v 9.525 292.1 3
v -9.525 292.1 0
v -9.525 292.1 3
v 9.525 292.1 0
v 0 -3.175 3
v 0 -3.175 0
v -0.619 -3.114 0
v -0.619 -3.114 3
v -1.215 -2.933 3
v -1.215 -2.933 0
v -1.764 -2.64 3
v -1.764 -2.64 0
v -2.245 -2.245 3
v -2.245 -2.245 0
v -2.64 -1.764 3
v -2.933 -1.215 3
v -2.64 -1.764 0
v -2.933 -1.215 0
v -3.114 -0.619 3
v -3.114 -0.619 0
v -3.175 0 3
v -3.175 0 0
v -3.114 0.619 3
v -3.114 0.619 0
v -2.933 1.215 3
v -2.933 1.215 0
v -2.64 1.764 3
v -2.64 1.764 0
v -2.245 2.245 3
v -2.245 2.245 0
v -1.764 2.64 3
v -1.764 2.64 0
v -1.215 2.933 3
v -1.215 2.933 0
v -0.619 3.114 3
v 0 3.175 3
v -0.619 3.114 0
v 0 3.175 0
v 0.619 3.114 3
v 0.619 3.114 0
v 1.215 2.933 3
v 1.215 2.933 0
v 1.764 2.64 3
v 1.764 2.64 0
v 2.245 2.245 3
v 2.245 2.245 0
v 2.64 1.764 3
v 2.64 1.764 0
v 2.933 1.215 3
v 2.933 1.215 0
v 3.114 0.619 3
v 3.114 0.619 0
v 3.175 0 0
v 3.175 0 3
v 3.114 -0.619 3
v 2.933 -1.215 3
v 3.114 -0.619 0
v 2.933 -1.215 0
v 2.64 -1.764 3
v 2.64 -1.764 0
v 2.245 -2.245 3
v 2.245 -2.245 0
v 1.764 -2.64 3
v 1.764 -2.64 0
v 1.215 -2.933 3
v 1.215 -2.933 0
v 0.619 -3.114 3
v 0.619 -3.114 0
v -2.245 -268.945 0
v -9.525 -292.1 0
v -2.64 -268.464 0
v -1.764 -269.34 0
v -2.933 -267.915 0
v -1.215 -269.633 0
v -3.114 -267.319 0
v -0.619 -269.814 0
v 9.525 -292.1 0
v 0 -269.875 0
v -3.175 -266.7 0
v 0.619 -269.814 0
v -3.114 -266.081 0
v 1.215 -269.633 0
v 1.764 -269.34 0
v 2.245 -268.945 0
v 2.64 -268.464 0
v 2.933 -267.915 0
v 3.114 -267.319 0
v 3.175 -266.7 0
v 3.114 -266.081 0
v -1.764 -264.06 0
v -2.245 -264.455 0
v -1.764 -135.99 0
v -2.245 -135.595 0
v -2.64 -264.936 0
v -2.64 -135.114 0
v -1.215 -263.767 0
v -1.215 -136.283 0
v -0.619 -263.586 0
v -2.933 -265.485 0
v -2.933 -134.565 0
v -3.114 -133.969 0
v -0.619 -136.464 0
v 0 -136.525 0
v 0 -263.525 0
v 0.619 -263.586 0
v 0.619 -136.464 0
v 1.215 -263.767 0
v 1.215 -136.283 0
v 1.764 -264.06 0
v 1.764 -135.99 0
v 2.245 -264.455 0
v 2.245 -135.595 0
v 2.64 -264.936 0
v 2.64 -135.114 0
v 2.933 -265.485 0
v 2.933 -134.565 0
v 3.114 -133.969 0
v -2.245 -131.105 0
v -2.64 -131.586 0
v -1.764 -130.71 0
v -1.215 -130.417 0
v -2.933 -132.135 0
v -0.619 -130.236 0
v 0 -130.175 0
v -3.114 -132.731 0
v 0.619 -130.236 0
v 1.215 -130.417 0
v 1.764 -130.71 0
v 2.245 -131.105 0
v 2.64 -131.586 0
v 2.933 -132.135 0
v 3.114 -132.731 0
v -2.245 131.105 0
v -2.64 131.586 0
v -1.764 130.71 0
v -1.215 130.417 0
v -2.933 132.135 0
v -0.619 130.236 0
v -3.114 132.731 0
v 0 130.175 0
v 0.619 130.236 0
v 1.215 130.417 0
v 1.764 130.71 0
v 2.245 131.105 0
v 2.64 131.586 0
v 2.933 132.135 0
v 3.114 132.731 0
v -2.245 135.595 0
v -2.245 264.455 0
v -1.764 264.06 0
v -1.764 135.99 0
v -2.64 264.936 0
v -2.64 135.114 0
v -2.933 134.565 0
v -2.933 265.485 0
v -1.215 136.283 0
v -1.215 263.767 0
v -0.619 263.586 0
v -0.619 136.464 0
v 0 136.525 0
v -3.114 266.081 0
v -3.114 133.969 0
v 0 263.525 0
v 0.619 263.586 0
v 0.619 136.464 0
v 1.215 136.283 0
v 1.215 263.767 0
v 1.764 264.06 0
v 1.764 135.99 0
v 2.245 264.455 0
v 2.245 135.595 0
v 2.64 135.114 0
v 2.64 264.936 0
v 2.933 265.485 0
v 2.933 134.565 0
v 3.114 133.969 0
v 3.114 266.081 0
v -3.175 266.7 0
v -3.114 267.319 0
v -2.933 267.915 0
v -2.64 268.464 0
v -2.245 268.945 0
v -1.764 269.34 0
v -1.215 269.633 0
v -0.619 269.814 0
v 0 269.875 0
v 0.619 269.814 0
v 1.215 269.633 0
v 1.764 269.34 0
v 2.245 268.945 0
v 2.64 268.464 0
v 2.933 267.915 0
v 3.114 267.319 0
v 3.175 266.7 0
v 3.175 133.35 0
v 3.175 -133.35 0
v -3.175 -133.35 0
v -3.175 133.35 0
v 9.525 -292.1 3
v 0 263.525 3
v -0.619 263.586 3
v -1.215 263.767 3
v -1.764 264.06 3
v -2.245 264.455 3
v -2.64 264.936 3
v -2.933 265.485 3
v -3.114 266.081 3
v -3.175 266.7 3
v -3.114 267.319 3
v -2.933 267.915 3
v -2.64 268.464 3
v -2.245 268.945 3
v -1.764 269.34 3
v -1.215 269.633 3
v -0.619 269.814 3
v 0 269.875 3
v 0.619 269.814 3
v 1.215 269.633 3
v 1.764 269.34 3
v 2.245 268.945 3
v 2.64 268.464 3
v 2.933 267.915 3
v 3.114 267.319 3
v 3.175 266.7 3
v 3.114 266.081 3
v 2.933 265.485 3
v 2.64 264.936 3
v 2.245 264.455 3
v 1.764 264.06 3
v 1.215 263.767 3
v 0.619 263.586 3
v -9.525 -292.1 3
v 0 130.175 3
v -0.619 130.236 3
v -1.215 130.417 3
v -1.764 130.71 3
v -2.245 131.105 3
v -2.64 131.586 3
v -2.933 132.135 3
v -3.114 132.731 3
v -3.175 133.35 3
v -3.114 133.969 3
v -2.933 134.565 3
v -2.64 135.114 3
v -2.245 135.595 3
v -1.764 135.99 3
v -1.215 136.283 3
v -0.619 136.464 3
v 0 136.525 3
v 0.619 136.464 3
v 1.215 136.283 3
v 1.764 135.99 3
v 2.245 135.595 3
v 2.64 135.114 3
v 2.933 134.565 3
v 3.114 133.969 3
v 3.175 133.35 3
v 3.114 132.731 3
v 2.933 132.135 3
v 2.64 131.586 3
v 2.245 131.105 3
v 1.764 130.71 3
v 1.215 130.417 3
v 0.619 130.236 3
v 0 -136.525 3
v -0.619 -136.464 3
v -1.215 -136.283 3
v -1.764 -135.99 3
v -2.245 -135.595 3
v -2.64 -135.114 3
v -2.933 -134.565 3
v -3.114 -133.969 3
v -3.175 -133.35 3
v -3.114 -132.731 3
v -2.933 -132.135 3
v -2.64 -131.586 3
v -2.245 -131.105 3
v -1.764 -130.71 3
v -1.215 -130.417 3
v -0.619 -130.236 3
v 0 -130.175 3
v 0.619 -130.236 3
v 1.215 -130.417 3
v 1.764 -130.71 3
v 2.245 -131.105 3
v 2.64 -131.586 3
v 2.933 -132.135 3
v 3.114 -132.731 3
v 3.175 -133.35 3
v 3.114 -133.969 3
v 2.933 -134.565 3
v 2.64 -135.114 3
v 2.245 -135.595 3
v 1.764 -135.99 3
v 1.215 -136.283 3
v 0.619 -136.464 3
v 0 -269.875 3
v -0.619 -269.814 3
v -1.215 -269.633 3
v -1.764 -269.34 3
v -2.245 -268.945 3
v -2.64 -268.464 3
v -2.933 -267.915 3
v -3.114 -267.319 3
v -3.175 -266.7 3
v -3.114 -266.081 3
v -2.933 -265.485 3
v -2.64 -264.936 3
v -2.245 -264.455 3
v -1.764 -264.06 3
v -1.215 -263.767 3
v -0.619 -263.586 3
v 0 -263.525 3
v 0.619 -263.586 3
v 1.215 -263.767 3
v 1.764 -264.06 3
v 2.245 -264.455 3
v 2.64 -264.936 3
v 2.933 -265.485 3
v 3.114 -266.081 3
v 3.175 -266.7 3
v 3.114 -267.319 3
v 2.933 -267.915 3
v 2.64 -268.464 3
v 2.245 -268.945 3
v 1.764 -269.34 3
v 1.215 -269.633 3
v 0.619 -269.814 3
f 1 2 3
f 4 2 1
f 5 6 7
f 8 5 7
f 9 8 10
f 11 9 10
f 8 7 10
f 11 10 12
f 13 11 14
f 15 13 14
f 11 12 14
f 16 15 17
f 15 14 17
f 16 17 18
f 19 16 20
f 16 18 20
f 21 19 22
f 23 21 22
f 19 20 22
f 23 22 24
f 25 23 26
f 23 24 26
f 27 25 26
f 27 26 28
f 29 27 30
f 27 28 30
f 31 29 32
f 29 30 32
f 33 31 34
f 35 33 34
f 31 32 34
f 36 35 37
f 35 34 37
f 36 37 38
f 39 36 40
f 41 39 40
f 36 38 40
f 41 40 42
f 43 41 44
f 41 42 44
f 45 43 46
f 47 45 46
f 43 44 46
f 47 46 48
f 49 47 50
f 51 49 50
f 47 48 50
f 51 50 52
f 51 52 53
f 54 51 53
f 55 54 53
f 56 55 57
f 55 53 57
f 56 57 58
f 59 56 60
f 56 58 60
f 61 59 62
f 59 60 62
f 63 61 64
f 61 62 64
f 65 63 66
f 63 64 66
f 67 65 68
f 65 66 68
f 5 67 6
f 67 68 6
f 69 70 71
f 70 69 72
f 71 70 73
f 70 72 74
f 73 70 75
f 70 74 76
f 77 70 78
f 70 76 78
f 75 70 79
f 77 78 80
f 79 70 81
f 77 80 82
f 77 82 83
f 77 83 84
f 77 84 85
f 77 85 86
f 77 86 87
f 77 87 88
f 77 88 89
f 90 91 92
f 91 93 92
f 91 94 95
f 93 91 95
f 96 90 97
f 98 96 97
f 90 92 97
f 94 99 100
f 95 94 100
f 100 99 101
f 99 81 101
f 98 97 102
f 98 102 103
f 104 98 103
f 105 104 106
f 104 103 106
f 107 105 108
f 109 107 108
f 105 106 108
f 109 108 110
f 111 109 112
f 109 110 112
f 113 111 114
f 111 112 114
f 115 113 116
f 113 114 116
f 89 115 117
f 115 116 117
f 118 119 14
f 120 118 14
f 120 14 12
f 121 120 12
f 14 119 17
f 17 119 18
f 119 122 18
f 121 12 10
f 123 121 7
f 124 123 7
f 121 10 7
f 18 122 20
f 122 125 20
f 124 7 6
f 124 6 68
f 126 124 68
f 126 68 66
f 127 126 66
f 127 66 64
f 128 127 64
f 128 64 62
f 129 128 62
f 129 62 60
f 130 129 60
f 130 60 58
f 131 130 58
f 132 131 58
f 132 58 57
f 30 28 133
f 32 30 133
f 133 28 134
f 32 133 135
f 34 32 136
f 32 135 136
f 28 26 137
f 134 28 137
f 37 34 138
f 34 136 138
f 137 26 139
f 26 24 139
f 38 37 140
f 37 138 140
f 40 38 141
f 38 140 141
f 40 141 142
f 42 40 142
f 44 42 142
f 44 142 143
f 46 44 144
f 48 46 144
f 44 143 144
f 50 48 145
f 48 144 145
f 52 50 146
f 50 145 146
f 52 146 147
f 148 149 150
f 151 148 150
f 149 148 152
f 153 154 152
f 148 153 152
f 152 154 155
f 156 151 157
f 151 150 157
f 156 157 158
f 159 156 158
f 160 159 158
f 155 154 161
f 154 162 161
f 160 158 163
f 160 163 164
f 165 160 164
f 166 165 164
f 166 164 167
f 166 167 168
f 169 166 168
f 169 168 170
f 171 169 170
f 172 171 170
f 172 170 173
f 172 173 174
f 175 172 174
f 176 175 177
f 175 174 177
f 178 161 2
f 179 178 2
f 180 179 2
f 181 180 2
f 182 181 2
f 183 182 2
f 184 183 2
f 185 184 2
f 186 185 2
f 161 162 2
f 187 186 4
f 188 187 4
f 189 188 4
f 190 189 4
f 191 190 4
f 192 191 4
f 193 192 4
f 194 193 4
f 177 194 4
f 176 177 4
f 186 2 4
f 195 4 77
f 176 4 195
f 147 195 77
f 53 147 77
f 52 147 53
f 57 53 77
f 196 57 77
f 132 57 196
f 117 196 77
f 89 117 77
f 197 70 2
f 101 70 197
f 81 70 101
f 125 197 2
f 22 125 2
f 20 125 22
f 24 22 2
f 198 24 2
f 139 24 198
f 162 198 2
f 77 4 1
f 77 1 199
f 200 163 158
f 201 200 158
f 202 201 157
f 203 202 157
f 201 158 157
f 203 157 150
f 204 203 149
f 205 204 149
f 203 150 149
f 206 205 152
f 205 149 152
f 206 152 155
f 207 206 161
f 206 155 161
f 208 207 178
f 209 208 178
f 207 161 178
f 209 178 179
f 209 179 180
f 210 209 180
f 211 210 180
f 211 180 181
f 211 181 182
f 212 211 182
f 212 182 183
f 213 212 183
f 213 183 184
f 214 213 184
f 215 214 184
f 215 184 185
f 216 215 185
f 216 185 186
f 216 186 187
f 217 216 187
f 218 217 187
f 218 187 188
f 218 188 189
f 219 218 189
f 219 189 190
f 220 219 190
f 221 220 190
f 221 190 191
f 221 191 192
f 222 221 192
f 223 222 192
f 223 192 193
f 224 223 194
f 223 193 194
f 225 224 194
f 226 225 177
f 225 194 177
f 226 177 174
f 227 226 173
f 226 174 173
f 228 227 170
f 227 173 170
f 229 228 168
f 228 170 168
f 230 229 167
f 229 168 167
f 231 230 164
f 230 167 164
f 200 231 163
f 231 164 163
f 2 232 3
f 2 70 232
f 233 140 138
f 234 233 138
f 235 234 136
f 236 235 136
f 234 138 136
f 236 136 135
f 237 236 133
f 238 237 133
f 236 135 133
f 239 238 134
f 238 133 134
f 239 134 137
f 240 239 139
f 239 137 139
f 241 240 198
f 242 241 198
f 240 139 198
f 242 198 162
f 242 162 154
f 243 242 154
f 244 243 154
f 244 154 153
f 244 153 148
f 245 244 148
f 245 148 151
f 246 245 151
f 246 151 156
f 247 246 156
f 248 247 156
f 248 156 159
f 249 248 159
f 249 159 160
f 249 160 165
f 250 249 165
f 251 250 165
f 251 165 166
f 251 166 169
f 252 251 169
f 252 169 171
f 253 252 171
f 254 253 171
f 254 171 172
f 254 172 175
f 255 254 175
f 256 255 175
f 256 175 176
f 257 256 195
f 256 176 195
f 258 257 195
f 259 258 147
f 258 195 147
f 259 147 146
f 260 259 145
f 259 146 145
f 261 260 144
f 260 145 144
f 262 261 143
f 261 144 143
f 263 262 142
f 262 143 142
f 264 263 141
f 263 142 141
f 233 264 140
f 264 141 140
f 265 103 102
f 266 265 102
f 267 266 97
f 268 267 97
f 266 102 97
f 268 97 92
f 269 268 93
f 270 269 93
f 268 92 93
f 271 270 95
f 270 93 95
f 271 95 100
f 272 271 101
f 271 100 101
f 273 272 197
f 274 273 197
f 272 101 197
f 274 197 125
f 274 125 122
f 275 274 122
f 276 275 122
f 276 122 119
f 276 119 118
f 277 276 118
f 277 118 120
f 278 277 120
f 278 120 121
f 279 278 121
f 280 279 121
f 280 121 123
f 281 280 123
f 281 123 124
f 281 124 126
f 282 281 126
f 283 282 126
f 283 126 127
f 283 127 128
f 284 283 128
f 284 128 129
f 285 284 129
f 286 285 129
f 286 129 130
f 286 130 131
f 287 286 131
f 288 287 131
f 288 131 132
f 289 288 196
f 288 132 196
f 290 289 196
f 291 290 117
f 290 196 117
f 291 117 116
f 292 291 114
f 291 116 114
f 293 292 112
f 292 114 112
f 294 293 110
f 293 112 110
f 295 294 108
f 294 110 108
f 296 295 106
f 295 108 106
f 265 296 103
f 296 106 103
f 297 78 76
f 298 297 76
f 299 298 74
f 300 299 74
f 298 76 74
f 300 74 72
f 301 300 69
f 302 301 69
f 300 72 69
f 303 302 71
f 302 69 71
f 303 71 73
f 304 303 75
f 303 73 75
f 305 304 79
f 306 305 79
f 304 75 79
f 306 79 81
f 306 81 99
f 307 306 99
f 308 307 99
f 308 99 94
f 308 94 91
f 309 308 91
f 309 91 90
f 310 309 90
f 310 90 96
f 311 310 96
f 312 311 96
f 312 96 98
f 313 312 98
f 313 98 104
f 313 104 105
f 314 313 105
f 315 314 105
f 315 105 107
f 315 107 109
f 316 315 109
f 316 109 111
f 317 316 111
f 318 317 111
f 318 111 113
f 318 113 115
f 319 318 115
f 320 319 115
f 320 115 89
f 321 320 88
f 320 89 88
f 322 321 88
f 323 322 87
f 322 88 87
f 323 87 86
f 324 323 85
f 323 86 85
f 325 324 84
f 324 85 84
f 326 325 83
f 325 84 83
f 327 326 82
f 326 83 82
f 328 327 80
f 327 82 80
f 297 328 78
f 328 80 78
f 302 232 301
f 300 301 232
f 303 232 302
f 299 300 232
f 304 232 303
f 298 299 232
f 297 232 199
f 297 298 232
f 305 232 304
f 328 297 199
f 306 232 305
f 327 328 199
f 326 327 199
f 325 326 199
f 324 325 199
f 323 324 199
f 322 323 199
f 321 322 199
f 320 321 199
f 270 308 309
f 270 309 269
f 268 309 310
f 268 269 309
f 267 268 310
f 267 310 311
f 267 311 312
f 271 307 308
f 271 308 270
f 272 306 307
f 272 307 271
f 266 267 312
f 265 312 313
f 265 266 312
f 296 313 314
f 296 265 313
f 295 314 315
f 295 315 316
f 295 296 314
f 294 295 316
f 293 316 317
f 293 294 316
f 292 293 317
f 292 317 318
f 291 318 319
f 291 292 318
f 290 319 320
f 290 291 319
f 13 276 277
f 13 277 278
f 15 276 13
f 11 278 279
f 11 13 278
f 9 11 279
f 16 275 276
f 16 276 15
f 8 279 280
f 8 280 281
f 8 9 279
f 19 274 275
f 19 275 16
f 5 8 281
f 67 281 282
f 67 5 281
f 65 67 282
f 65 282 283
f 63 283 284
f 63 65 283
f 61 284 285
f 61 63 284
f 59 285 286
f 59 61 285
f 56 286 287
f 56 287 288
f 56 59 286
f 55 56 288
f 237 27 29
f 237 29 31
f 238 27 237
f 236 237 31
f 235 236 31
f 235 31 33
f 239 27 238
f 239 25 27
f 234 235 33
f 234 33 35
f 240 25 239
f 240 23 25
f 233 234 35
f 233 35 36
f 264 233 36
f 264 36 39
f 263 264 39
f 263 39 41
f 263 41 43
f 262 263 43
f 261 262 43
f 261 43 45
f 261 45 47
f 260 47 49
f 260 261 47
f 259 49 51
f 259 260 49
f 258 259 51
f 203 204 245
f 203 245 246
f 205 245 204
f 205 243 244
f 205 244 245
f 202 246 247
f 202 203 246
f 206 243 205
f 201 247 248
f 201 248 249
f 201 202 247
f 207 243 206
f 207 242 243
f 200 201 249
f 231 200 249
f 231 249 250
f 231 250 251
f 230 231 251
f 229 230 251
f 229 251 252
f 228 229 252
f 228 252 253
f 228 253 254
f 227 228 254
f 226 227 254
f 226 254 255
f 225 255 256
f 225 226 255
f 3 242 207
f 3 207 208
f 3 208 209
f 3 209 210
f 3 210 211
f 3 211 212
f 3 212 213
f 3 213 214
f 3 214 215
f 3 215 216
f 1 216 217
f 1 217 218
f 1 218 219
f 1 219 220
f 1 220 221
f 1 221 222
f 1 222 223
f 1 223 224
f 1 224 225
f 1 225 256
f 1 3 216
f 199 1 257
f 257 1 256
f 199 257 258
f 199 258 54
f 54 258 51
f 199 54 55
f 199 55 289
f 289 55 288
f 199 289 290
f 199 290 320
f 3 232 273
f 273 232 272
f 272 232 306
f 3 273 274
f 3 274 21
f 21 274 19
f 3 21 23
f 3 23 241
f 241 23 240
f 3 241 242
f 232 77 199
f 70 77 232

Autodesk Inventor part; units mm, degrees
ref_plane "YZ Plane" through (0, 0, 0) normal (1, 0, 0) x (0, 1, 0)
ref_plane "XZ Plane" through (0, 0, 0) normal (0, 1, 0) x (-1, 0, 0)
ref_plane "XY Plane" through (0, 0, 0) normal (0, 0, 1) x (1, 0, 0)
sketch "Sketch1" plane through (0, 0, 0) normal (0, 0, 1) x (1, 0, 0)
  line L0 (-9.525, 292.1) -> (9.525, 292.1)
  line L1 (9.525, 292.1) -> (9.525, -292.1)
  line L2 (9.525, -292.1) -> (-9.525, -292.1)
  line L3 (-9.525, -292.1) -> (-9.525, 292.1)
  point P0 (0, 0)
  point P1 (9.525, 0)
  point P2 (0, 292.1)
  dimension "d0" = 19.05
  dimension "d1" = 584.2
extrude "Extrusion1" add sketch "Sketch1" along normal blind 3
sketch "Sketch2" plane through (0, 0, 3) normal (0, 0, 1) x (1, 0, 0)
  line L0 (-9.525, 292.1) -> (9.525, 292.1) projected
  line L1 (9.525, -292.1) -> (-9.525, -292.1) projected
  point P0 (0, 0)
  point P1 (0, 266.7)
  point P2 (0, 133.35)
  point P3 (0, 0)
  point P4 (0, -133.35)
  point P5 (0, -266.7)
  dimension "d4" = 25.4
  dimension "d5" = 133.35
  dimension "d6" = 133.35
  dimension "d7" = 133.35
  dimension "d8" = 133.35
  dimension "d9" = 25.4
hole "Hole1" at (0, 266.7, 3) at (0, 133.35, 3) at (0, 0, 3) at (0, -133.35, 3) at (0, -266.7, 3) direction (0, 0, -1) diameter 6.35 end through all
properties part number "top panel"
